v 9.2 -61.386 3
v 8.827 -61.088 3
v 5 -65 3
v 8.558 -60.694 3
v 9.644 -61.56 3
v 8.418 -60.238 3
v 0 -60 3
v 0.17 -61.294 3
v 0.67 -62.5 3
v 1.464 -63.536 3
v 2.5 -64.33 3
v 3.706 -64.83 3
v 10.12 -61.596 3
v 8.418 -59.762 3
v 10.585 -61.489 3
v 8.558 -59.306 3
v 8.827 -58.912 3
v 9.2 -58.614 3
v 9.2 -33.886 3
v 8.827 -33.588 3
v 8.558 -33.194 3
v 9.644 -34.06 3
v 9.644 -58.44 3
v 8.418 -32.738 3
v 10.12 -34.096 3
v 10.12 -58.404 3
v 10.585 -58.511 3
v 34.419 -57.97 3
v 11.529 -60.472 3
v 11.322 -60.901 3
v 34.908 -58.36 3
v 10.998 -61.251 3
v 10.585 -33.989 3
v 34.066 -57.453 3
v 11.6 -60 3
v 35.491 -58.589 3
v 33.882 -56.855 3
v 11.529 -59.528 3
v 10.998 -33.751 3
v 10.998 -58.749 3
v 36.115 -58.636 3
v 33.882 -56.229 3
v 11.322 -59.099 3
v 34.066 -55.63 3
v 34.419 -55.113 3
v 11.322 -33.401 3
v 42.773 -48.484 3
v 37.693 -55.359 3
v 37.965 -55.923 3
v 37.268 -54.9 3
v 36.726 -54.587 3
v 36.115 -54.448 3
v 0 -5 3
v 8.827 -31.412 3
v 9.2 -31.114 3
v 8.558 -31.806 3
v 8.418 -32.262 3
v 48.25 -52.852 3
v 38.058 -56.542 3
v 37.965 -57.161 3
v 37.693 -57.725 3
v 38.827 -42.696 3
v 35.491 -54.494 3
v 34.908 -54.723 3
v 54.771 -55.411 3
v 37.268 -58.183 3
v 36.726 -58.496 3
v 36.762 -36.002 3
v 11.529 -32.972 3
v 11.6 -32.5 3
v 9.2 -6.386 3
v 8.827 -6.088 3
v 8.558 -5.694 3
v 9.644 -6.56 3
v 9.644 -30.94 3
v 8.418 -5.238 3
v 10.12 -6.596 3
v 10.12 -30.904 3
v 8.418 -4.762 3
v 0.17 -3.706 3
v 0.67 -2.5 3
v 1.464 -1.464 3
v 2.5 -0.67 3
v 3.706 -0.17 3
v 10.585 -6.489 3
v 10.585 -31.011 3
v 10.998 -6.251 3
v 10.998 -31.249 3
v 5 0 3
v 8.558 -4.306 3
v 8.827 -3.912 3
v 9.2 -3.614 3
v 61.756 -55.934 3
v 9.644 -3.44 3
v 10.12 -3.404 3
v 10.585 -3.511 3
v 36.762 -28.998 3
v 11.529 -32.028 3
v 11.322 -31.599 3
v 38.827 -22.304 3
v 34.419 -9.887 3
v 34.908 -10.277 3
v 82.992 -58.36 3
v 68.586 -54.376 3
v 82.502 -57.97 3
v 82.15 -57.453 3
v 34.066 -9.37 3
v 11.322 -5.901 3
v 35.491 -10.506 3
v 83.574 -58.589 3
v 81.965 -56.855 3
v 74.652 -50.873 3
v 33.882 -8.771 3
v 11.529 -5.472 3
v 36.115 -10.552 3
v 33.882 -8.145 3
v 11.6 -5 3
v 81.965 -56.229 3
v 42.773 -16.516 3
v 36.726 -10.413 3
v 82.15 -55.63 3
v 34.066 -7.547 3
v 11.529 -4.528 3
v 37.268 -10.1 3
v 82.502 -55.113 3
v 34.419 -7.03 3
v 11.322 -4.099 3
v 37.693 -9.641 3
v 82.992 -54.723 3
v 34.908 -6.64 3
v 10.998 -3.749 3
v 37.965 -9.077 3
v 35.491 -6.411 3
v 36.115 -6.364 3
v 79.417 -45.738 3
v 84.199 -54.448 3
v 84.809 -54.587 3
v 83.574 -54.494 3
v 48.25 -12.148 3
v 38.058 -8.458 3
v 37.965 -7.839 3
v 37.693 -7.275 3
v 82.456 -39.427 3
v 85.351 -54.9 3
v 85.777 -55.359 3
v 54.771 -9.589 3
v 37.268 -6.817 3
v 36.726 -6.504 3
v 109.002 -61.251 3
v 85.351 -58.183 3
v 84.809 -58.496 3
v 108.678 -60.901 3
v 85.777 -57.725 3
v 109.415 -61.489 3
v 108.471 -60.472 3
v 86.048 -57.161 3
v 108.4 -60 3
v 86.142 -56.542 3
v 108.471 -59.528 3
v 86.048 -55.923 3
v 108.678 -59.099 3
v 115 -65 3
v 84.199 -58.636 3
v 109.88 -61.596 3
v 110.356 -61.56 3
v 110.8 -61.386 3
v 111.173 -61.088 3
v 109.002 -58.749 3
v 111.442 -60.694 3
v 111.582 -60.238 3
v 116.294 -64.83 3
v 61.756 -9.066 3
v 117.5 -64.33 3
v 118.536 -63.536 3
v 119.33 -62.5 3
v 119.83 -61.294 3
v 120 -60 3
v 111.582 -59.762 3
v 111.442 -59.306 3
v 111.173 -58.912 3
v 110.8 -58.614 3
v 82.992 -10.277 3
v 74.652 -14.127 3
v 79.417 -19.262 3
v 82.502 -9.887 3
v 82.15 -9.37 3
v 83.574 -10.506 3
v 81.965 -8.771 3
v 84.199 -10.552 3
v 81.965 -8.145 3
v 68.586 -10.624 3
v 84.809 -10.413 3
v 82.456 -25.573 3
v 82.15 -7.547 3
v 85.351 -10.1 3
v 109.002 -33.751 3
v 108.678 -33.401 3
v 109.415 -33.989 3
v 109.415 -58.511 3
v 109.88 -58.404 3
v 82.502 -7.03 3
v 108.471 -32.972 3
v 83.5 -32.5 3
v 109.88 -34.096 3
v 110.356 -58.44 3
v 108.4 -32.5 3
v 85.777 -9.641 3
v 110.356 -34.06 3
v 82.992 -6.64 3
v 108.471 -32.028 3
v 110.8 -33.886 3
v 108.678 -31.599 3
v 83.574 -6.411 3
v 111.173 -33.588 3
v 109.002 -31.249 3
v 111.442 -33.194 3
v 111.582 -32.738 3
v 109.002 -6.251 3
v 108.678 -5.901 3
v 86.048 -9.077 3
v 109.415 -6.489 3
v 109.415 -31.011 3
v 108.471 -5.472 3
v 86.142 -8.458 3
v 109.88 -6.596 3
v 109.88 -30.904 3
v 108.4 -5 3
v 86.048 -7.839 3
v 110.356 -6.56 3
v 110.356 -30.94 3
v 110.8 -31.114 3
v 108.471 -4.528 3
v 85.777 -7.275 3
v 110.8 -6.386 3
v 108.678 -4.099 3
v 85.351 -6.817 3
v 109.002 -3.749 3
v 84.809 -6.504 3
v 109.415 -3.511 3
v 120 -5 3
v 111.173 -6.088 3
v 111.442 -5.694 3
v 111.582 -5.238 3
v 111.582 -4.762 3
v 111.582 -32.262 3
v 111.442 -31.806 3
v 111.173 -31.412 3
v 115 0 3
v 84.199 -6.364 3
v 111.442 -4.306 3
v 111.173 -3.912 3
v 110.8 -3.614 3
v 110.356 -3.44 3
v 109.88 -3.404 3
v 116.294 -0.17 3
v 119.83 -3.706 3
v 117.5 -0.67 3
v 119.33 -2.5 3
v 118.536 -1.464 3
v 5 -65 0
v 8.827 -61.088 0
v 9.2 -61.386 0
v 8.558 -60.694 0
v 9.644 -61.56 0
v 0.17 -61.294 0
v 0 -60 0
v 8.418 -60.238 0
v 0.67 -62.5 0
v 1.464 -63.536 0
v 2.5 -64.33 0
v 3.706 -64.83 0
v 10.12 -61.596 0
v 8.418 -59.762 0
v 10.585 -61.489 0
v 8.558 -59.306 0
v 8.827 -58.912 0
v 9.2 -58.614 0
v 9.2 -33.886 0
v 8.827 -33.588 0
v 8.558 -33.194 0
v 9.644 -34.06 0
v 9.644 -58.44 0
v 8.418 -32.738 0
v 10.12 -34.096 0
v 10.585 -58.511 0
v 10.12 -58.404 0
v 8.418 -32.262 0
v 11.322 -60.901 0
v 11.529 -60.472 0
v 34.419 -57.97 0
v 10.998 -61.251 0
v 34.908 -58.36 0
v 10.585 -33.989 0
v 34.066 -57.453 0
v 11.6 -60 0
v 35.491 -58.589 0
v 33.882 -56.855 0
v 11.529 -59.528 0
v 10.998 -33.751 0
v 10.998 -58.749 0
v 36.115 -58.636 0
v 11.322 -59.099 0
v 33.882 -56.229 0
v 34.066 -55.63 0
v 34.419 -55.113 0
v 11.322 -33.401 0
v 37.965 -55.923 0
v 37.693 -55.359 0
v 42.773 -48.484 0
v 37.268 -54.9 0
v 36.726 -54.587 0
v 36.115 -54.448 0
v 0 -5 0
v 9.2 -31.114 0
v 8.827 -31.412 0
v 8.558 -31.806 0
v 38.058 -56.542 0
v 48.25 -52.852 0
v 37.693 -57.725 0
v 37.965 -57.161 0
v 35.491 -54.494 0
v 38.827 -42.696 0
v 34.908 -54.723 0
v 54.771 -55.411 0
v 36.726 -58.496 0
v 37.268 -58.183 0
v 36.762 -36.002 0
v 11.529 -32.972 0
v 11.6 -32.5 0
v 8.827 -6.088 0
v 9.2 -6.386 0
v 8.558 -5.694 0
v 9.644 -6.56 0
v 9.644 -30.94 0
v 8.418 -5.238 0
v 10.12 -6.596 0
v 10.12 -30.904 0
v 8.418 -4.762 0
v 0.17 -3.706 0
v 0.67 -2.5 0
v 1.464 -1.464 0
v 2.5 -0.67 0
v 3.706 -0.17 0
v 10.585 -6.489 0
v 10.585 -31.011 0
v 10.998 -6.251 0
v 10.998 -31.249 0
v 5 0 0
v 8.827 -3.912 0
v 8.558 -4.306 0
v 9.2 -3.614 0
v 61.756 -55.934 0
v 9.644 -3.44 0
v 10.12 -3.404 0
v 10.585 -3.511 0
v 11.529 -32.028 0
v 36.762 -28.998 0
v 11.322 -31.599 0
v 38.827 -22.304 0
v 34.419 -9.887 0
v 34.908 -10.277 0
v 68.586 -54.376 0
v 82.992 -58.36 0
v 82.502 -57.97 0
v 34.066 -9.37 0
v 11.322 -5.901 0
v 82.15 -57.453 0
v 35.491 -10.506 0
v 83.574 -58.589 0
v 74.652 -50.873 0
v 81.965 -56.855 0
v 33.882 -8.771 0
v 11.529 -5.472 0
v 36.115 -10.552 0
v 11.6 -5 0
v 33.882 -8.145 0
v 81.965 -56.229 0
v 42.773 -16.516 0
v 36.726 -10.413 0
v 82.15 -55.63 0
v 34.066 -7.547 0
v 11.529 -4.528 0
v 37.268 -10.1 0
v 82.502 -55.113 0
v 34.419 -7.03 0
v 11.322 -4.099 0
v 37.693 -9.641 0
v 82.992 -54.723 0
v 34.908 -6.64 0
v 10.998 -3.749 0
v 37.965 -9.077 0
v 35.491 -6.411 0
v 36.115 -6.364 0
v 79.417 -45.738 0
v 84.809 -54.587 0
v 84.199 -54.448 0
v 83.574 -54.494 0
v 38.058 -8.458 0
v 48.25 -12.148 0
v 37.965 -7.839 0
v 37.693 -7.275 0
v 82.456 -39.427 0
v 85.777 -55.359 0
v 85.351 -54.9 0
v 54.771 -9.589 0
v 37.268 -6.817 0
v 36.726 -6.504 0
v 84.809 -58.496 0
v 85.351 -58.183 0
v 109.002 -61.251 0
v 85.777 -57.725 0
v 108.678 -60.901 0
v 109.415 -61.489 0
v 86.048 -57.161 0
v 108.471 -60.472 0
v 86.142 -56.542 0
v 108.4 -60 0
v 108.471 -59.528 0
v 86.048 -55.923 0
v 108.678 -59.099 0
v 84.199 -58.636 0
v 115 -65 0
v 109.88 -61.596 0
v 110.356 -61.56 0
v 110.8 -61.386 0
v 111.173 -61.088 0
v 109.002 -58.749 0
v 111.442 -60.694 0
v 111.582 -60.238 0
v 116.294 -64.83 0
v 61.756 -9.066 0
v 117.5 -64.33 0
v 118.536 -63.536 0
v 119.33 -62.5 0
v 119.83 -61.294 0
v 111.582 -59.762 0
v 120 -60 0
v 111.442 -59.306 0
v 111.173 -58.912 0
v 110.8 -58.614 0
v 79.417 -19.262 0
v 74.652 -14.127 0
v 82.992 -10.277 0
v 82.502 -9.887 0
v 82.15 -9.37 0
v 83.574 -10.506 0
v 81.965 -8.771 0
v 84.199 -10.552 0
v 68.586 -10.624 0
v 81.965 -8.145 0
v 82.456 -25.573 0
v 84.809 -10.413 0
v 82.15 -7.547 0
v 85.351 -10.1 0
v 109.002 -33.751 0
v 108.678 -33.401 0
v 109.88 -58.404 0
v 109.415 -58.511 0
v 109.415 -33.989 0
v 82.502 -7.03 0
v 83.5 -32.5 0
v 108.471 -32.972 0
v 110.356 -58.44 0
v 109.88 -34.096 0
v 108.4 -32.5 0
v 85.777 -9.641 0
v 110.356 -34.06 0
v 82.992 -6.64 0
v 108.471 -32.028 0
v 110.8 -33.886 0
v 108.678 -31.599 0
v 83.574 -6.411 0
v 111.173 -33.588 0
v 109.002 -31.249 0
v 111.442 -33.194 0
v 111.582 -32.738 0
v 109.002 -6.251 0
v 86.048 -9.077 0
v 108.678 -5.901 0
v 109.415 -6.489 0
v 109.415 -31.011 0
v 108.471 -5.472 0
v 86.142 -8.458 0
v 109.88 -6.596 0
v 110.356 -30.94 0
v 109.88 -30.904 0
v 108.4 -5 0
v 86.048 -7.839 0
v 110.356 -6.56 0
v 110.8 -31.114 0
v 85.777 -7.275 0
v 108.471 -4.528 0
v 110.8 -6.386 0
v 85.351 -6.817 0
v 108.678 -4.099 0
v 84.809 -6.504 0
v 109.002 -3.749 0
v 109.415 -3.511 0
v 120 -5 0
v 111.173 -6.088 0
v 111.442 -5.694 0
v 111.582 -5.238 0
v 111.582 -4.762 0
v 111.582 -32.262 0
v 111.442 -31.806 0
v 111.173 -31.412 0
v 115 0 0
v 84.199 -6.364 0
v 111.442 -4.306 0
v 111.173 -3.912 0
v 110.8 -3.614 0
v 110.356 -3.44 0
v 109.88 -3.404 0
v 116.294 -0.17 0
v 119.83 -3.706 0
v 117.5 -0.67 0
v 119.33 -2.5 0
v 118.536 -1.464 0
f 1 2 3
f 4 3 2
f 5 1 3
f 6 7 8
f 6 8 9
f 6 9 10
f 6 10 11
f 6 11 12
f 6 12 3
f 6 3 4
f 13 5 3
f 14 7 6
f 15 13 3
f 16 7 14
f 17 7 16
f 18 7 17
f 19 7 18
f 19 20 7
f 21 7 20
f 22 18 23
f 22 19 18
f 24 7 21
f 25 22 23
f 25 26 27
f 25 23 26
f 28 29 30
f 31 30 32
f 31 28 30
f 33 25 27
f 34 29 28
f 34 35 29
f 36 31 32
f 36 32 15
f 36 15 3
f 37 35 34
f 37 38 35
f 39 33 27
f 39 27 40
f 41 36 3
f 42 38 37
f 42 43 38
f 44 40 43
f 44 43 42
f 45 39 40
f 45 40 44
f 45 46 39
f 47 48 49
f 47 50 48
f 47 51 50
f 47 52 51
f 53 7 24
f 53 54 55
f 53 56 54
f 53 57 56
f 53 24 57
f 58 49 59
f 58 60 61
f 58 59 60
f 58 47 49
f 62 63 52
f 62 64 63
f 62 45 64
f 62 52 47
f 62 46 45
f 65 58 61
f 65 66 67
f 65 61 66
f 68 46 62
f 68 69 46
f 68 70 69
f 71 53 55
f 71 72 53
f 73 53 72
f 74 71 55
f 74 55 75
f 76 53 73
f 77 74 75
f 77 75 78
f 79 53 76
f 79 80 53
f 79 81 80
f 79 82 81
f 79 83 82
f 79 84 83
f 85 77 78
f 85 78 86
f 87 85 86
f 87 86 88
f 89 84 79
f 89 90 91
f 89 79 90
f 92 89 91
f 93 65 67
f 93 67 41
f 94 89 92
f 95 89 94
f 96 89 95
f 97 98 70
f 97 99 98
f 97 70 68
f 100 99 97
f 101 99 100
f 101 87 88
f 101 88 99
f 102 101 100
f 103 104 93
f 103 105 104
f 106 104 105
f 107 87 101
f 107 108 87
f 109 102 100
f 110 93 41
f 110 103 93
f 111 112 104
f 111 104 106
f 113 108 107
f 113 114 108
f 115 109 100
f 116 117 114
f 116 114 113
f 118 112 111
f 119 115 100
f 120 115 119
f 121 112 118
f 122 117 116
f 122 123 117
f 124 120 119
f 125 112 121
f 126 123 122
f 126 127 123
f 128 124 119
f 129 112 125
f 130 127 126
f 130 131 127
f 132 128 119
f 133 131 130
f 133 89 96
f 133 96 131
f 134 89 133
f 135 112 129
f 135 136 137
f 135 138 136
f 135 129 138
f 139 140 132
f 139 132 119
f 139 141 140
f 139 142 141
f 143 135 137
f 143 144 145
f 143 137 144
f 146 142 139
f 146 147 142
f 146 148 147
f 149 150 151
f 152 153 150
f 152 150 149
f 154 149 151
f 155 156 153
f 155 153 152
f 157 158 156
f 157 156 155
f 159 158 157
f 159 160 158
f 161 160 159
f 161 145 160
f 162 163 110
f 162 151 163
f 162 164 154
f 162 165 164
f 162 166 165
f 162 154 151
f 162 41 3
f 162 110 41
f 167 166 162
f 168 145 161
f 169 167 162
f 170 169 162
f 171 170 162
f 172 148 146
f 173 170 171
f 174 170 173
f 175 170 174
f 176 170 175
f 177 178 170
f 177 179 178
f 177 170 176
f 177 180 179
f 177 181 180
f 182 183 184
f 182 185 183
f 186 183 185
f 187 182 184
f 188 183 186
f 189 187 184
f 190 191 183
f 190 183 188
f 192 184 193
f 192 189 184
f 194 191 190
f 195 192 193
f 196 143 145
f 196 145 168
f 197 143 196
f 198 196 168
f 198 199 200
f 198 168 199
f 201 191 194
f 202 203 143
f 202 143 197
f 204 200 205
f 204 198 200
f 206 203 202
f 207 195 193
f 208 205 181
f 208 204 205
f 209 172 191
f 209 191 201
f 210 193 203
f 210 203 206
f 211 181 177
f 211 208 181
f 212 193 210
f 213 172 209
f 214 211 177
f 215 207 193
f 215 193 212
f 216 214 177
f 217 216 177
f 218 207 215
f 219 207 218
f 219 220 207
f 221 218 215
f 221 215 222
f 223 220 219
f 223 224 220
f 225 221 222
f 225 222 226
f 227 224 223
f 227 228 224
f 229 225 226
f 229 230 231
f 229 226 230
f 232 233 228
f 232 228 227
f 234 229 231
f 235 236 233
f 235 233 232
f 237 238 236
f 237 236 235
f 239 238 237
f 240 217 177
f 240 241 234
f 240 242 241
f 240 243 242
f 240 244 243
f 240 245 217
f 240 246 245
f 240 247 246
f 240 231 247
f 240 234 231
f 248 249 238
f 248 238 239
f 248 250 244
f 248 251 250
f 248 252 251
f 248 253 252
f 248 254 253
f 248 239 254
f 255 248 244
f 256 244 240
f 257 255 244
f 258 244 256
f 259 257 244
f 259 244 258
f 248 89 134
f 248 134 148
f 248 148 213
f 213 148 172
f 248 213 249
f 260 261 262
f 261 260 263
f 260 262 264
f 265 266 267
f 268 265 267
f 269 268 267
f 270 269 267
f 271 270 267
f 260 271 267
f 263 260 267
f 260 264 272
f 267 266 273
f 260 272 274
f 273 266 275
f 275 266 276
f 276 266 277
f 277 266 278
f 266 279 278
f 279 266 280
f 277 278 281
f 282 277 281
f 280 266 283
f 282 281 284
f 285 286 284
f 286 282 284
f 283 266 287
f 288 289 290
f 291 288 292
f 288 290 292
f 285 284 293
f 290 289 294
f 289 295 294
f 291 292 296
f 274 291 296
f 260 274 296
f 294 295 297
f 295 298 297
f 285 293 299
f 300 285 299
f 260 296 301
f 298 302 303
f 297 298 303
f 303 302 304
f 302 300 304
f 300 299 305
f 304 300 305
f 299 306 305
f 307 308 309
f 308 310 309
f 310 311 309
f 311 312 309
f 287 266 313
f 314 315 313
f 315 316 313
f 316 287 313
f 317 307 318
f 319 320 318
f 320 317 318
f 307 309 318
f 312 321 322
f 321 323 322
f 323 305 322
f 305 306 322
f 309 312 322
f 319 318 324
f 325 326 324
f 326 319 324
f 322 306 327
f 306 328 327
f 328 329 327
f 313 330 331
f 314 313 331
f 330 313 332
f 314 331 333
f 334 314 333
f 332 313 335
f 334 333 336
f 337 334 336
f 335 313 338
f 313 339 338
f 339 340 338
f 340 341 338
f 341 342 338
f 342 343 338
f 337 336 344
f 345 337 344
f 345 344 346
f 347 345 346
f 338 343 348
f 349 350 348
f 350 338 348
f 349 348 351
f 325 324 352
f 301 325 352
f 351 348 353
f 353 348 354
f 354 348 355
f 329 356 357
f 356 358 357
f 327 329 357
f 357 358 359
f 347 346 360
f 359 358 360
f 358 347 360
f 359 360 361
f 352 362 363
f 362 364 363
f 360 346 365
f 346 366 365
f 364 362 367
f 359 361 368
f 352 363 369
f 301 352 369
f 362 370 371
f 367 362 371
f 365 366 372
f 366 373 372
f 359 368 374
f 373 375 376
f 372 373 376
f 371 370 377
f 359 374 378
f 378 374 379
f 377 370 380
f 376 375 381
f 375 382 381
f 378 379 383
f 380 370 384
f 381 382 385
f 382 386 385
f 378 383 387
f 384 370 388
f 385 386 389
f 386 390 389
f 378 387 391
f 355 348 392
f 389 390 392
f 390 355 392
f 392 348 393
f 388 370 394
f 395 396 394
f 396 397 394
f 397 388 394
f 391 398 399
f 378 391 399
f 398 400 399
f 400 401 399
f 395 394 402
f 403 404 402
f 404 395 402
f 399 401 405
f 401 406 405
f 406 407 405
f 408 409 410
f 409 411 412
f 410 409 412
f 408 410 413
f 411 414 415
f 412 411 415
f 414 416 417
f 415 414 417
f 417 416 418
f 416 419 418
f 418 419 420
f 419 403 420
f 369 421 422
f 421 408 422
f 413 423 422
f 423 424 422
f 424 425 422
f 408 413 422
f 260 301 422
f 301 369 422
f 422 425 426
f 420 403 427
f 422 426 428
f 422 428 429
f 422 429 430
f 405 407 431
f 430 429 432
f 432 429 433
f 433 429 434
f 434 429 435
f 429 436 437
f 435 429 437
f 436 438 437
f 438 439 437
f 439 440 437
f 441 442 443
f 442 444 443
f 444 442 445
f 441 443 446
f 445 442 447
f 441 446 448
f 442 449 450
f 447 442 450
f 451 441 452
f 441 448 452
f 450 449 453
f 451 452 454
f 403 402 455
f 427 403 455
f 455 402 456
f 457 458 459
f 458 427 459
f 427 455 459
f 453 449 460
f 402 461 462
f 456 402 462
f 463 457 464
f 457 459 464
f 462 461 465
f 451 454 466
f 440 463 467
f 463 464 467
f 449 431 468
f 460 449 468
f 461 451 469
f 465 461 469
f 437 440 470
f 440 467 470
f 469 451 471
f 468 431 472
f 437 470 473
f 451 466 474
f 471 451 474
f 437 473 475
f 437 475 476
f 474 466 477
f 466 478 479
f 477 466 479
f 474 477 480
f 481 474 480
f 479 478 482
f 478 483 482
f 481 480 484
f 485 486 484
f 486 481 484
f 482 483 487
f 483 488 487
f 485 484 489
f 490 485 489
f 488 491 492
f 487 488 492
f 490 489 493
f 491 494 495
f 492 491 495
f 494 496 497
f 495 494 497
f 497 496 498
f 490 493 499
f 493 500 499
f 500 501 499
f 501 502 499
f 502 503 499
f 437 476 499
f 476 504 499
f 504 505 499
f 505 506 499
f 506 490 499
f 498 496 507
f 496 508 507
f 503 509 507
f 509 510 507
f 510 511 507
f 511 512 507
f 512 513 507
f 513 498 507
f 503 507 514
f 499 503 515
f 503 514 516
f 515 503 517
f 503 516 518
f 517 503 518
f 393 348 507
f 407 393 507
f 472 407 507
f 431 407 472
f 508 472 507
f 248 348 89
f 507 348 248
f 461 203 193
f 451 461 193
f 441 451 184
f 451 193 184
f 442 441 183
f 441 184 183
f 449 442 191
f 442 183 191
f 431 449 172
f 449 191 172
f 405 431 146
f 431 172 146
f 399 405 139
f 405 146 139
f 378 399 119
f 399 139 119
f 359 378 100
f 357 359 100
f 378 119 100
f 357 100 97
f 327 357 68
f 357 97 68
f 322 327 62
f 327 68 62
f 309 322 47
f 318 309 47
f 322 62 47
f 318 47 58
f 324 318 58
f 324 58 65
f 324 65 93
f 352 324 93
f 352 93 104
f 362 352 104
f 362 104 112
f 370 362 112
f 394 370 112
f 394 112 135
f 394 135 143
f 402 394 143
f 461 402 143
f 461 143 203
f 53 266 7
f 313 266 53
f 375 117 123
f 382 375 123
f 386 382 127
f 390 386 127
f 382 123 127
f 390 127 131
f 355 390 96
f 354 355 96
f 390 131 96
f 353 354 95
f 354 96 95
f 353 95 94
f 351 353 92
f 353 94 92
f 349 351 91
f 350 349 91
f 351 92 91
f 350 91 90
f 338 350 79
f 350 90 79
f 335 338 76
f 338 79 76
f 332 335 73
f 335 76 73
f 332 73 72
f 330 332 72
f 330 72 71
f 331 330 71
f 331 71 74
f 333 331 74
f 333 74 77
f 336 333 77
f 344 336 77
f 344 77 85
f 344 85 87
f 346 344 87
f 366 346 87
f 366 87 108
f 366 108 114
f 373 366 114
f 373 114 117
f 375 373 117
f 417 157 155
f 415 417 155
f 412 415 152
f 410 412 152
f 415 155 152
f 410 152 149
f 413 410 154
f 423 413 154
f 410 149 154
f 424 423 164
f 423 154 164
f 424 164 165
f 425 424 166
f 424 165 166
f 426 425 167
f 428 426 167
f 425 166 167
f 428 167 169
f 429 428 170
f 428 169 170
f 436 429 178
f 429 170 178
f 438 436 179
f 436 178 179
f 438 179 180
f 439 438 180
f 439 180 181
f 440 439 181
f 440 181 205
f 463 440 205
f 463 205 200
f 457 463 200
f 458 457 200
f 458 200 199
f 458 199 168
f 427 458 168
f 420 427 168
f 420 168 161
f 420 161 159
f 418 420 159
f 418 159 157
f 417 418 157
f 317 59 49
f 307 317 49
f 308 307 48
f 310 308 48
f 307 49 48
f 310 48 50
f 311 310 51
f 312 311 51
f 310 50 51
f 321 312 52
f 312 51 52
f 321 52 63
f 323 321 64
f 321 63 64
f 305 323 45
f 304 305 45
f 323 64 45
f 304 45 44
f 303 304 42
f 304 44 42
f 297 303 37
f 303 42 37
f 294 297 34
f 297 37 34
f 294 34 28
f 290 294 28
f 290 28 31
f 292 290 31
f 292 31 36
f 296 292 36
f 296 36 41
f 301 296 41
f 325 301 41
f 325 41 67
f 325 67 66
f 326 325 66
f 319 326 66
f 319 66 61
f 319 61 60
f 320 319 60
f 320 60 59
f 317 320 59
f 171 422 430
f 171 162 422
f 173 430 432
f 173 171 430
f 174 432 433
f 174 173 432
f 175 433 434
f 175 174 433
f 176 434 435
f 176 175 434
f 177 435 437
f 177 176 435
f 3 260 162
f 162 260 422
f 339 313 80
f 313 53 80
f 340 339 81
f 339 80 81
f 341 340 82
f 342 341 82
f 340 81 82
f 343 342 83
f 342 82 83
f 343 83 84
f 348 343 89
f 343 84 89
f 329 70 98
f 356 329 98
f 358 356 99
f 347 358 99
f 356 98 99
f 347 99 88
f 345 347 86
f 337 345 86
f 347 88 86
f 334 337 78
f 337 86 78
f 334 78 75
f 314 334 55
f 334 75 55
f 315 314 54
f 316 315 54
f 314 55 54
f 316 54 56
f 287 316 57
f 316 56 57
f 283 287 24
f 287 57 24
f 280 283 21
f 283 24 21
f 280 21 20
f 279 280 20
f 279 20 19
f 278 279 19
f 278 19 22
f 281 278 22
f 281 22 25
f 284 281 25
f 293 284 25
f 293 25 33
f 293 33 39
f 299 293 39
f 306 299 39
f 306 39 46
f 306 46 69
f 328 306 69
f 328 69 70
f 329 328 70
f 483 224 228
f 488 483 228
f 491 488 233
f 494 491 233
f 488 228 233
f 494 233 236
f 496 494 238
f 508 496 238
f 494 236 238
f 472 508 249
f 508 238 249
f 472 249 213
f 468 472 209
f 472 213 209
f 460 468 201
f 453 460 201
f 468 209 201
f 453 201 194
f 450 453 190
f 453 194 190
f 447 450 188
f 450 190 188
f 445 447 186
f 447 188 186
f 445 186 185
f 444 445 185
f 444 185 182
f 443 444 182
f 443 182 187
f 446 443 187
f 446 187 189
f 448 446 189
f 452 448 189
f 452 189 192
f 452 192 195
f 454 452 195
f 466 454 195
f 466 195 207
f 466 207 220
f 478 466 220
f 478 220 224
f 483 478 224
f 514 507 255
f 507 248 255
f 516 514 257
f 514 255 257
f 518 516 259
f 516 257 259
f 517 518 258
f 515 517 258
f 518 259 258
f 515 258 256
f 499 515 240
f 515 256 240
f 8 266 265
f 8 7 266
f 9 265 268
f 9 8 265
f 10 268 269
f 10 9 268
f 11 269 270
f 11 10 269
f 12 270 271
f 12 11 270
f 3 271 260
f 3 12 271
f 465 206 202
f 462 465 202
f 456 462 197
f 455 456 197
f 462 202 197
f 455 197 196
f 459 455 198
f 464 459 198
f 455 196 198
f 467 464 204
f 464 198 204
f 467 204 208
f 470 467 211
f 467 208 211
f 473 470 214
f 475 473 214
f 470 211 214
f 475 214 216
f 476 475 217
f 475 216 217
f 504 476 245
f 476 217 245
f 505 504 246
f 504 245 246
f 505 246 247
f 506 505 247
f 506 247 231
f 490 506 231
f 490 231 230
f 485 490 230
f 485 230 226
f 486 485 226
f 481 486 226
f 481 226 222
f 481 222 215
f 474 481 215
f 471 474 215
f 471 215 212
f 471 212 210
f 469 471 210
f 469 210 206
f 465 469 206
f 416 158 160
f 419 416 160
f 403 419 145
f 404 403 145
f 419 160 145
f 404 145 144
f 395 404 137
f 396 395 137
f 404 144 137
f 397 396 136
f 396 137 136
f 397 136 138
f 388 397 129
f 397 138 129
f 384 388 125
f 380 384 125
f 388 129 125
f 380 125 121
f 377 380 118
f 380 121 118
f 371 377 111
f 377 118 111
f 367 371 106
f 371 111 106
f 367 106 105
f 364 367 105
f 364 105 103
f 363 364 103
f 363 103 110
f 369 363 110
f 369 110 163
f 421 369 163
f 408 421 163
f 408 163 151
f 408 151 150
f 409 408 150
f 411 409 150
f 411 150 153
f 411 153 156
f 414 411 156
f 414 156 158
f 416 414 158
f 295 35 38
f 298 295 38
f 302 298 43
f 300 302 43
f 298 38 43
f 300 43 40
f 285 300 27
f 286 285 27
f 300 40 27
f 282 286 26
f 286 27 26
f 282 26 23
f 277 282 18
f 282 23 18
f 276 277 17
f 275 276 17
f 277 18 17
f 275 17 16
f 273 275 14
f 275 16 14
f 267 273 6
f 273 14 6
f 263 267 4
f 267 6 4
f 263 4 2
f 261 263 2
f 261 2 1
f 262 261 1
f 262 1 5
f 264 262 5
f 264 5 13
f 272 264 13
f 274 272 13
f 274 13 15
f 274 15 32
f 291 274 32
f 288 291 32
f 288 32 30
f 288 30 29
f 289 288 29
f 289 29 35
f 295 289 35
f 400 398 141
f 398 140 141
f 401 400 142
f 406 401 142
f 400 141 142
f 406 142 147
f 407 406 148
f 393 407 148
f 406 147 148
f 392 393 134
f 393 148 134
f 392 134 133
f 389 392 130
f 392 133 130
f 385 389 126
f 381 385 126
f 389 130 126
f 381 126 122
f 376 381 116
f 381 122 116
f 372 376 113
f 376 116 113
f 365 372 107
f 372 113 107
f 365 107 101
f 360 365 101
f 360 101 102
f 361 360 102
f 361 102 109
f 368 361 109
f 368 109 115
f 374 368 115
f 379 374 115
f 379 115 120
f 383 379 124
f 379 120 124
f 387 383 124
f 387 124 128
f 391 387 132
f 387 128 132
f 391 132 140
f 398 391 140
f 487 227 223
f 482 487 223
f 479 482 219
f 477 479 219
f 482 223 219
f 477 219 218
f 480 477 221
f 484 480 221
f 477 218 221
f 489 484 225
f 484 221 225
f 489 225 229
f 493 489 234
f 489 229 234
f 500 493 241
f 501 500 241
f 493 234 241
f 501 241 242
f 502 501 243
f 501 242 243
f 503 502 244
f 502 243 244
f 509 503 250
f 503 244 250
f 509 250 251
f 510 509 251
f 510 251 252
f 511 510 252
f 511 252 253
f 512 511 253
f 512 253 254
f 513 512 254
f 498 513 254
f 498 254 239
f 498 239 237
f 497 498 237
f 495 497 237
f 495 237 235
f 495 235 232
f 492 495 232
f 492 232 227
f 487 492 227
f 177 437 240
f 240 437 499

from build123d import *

# Parameters (mm, degrees)
SKETCH_1_W          = 120
SKETCH_1_H          = 65
EXTRUDE_1_DEPTH     = 3
SKETCH_2_R          = 1.6
CUT_EXTRUDE_1_DEPTH = 137.506410106
FILLET_1_R          = 5
SKETCH_3_R          = 23.5
CUT_EXTRUDE_2_DEPTH = 10
SKETCH_4_R          = 2.1
CUT_EXTRUDE_3_DEPTH = 5


with BuildPart() as part:
    # 草图1 → 凸台-拉伸1 (new body)
    with BuildSketch(Plane.XY):
        with Locations((60, -32.5)):
            Rectangle(SKETCH_1_W, SKETCH_1_H)
    extrude(amount=EXTRUDE_1_DEPTH)

    # 草图2 → 切除-拉伸1 (cut, through all)
    with BuildSketch(Plane.XY.offset(3)):
        with Locations((10, -5)):
            Circle(SKETCH_2_R)
        with Locations((10, -32.5)):
            Circle(SKETCH_2_R)
        with Locations((10, -60)):
            Circle(SKETCH_2_R)
        with Locations(Location((110, -60, 0), (0, 0, 180))):
            Circle(SKETCH_2_R)
        with Locations(Location((110, -32.5, 0), (0, 0, 180))):
            Circle(SKETCH_2_R)
        with Locations(Location((110, -5, 0), (0, 0, 180))):
            Circle(SKETCH_2_R)
    extrude(amount=-CUT_EXTRUDE_1_DEPTH, mode=Mode.SUBTRACT)

    # 圆角1
    fillet_1_edges = [part.edges().sort_by_distance(p)[0] for p in [
        (0, 0, 1.5),
        (120, 0, 1.5),
        (120, -65, 1.5),
        (0, -65, 1.5),
    ]]
    fillet(fillet_1_edges, radius=FILLET_1_R)

    # 草图3 → 切除-拉伸2 (cut)
    with BuildSketch(Plane.XY.offset(3)):
        with Locations((60, -32.5)):
            Circle(SKETCH_3_R)
    extrude(amount=-CUT_EXTRUDE_2_DEPTH, mode=Mode.SUBTRACT)

    # 草图4 → 切除-拉伸3 (cut, symmetric)
    with BuildSketch(Plane.XY.offset(3)):
        with Locations((84.04163056, -8.45836944)):
            Circle(SKETCH_4_R)
        with Locations((84.04163056, -56.54163056)):
            Circle(SKETCH_4_R)
        with Locations((35.95836944, -56.54163056)):
            Circle(SKETCH_4_R)
        with Locations((35.95836944, -8.45836944)):
            Circle(SKETCH_4_R)
    extrude(amount=CUT_EXTRUDE_3_DEPTH, both=True, mode=Mode.SUBTRACT)


solid = part.part
